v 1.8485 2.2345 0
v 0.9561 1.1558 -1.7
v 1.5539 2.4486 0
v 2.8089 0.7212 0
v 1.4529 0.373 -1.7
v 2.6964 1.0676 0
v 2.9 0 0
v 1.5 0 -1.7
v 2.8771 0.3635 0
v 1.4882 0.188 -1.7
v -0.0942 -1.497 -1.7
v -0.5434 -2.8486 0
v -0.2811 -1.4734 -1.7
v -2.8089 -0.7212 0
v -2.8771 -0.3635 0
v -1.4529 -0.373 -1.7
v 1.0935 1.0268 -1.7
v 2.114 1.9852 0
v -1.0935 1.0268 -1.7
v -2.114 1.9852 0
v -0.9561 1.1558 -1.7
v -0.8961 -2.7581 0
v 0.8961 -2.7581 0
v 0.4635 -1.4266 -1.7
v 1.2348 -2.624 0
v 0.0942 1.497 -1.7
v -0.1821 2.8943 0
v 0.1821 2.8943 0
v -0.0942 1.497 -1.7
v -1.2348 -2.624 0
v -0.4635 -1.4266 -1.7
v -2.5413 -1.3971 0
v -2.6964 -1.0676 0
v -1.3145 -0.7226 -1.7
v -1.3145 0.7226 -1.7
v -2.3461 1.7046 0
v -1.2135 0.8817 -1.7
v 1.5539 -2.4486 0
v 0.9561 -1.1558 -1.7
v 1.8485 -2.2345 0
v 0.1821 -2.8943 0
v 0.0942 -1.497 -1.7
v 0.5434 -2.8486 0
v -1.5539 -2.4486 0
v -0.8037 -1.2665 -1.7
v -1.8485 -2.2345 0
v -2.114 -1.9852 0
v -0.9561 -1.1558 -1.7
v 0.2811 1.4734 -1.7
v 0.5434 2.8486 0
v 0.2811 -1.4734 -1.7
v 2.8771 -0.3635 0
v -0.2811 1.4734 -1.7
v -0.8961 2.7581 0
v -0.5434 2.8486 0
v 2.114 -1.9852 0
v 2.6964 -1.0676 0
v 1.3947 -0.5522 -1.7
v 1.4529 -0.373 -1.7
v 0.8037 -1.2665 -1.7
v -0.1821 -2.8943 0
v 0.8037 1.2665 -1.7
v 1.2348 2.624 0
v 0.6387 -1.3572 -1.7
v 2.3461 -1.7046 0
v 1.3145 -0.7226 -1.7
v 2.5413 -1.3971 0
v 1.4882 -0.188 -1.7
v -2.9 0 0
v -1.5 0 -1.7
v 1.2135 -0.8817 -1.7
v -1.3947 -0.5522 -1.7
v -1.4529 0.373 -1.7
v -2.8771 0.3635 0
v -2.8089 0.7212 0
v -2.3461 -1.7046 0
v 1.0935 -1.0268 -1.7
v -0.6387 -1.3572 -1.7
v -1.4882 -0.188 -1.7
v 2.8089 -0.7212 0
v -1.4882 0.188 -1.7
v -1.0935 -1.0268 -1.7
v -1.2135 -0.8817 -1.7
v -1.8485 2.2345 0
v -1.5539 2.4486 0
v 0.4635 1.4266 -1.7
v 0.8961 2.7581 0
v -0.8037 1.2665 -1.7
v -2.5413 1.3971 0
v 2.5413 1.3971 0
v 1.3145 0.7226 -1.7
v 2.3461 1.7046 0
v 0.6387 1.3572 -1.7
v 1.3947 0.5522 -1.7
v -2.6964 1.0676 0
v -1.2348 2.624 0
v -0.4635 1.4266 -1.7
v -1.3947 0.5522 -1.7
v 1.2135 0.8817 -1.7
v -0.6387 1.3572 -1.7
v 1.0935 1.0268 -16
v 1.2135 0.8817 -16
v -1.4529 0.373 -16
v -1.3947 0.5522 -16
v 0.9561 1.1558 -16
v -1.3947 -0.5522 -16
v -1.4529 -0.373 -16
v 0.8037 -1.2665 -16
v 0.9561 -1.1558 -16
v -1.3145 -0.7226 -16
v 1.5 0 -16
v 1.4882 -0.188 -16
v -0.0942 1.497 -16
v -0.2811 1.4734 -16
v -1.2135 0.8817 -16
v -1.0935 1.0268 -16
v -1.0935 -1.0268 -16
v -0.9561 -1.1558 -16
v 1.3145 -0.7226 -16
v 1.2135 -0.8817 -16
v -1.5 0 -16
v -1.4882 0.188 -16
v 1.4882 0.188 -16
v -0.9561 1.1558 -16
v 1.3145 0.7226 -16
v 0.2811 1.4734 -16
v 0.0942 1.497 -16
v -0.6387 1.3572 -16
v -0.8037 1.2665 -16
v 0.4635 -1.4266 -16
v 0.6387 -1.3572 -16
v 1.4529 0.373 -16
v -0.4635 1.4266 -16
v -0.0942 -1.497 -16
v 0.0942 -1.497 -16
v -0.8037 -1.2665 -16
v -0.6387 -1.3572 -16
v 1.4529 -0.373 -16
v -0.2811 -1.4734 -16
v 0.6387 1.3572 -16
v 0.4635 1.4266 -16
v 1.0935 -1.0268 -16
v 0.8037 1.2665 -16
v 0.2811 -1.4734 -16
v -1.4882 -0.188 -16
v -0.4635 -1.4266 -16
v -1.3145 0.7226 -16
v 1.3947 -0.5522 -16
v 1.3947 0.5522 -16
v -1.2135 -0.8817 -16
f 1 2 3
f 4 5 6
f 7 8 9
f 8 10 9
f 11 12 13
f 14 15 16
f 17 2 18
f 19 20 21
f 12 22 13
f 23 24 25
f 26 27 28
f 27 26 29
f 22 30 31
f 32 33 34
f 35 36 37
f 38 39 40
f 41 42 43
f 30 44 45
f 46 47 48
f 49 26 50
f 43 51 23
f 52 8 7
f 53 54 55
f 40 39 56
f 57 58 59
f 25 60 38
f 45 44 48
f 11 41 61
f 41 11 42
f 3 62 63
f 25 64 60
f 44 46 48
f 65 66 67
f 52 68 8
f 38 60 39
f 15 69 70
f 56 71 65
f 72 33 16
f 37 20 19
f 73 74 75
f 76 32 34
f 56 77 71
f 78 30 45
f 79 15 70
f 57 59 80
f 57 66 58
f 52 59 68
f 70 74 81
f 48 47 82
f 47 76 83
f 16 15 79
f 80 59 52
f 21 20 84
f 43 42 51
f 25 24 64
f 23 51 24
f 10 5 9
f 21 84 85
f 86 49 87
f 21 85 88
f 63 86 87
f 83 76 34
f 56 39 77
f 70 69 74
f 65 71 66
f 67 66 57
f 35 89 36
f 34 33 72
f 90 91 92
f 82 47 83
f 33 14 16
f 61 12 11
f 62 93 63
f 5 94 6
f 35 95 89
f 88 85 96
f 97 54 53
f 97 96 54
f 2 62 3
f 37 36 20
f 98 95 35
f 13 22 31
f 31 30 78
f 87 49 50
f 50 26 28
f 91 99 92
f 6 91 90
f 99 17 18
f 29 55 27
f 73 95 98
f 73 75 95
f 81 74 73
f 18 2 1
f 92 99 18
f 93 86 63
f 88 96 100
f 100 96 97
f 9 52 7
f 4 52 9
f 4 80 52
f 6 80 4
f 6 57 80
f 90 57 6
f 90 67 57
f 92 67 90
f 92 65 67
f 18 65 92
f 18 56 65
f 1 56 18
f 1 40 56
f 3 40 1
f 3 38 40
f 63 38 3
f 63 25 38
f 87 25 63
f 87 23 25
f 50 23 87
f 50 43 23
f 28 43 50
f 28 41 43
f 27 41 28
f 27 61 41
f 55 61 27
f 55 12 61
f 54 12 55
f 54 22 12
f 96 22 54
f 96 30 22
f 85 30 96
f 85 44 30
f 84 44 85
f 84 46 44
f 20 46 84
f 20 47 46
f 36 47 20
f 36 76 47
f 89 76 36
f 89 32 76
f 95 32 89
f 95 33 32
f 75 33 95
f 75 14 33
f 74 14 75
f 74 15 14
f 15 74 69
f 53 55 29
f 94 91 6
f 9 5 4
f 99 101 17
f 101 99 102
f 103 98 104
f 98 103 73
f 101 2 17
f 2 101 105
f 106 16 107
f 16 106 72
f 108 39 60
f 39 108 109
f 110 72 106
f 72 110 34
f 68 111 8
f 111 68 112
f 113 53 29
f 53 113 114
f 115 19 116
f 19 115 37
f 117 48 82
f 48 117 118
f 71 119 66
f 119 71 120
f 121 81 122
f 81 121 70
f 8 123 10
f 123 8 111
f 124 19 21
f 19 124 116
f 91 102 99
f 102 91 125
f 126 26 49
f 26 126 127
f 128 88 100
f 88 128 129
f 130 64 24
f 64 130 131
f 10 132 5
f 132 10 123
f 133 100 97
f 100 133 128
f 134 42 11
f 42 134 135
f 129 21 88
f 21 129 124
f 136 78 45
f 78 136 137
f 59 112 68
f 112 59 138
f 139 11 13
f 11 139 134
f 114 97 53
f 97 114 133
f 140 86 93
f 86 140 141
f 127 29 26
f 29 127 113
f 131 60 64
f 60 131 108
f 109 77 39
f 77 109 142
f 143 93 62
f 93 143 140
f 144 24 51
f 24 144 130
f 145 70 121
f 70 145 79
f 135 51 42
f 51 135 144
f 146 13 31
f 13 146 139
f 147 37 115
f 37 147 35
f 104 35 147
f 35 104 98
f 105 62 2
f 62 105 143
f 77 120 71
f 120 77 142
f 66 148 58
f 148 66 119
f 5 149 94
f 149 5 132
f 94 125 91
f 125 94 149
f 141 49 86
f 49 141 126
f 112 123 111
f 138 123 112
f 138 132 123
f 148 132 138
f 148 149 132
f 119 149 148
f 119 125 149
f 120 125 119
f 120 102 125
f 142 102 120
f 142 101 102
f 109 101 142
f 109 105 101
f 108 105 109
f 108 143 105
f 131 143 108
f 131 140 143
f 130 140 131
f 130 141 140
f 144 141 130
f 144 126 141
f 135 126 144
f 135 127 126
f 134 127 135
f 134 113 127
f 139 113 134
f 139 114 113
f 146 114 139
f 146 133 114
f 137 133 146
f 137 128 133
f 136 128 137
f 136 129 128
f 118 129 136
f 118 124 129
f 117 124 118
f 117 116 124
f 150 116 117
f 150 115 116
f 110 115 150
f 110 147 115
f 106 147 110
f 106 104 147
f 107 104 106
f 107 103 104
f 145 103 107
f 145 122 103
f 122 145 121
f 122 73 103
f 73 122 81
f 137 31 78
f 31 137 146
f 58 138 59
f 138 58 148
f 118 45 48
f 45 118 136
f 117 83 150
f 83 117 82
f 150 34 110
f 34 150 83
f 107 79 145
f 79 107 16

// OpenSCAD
$fn = 50;

difference() {
	union() {
		translate(v = [0, 0, 0]) {
			rotate(a = [0, 0, 0]) {
				difference() {
					union() {
						translate(v = [0, 0, -1.7]) {
							cylinder(h = 1.7, r1 = 1.5, r2 = 2.9);
						}
						translate(v = [0, 0, -16.0]) {
							cylinder(h = 16, r = 1.5);
						}
					}
					union();
				}
			}
		}
	}
	union();
}
